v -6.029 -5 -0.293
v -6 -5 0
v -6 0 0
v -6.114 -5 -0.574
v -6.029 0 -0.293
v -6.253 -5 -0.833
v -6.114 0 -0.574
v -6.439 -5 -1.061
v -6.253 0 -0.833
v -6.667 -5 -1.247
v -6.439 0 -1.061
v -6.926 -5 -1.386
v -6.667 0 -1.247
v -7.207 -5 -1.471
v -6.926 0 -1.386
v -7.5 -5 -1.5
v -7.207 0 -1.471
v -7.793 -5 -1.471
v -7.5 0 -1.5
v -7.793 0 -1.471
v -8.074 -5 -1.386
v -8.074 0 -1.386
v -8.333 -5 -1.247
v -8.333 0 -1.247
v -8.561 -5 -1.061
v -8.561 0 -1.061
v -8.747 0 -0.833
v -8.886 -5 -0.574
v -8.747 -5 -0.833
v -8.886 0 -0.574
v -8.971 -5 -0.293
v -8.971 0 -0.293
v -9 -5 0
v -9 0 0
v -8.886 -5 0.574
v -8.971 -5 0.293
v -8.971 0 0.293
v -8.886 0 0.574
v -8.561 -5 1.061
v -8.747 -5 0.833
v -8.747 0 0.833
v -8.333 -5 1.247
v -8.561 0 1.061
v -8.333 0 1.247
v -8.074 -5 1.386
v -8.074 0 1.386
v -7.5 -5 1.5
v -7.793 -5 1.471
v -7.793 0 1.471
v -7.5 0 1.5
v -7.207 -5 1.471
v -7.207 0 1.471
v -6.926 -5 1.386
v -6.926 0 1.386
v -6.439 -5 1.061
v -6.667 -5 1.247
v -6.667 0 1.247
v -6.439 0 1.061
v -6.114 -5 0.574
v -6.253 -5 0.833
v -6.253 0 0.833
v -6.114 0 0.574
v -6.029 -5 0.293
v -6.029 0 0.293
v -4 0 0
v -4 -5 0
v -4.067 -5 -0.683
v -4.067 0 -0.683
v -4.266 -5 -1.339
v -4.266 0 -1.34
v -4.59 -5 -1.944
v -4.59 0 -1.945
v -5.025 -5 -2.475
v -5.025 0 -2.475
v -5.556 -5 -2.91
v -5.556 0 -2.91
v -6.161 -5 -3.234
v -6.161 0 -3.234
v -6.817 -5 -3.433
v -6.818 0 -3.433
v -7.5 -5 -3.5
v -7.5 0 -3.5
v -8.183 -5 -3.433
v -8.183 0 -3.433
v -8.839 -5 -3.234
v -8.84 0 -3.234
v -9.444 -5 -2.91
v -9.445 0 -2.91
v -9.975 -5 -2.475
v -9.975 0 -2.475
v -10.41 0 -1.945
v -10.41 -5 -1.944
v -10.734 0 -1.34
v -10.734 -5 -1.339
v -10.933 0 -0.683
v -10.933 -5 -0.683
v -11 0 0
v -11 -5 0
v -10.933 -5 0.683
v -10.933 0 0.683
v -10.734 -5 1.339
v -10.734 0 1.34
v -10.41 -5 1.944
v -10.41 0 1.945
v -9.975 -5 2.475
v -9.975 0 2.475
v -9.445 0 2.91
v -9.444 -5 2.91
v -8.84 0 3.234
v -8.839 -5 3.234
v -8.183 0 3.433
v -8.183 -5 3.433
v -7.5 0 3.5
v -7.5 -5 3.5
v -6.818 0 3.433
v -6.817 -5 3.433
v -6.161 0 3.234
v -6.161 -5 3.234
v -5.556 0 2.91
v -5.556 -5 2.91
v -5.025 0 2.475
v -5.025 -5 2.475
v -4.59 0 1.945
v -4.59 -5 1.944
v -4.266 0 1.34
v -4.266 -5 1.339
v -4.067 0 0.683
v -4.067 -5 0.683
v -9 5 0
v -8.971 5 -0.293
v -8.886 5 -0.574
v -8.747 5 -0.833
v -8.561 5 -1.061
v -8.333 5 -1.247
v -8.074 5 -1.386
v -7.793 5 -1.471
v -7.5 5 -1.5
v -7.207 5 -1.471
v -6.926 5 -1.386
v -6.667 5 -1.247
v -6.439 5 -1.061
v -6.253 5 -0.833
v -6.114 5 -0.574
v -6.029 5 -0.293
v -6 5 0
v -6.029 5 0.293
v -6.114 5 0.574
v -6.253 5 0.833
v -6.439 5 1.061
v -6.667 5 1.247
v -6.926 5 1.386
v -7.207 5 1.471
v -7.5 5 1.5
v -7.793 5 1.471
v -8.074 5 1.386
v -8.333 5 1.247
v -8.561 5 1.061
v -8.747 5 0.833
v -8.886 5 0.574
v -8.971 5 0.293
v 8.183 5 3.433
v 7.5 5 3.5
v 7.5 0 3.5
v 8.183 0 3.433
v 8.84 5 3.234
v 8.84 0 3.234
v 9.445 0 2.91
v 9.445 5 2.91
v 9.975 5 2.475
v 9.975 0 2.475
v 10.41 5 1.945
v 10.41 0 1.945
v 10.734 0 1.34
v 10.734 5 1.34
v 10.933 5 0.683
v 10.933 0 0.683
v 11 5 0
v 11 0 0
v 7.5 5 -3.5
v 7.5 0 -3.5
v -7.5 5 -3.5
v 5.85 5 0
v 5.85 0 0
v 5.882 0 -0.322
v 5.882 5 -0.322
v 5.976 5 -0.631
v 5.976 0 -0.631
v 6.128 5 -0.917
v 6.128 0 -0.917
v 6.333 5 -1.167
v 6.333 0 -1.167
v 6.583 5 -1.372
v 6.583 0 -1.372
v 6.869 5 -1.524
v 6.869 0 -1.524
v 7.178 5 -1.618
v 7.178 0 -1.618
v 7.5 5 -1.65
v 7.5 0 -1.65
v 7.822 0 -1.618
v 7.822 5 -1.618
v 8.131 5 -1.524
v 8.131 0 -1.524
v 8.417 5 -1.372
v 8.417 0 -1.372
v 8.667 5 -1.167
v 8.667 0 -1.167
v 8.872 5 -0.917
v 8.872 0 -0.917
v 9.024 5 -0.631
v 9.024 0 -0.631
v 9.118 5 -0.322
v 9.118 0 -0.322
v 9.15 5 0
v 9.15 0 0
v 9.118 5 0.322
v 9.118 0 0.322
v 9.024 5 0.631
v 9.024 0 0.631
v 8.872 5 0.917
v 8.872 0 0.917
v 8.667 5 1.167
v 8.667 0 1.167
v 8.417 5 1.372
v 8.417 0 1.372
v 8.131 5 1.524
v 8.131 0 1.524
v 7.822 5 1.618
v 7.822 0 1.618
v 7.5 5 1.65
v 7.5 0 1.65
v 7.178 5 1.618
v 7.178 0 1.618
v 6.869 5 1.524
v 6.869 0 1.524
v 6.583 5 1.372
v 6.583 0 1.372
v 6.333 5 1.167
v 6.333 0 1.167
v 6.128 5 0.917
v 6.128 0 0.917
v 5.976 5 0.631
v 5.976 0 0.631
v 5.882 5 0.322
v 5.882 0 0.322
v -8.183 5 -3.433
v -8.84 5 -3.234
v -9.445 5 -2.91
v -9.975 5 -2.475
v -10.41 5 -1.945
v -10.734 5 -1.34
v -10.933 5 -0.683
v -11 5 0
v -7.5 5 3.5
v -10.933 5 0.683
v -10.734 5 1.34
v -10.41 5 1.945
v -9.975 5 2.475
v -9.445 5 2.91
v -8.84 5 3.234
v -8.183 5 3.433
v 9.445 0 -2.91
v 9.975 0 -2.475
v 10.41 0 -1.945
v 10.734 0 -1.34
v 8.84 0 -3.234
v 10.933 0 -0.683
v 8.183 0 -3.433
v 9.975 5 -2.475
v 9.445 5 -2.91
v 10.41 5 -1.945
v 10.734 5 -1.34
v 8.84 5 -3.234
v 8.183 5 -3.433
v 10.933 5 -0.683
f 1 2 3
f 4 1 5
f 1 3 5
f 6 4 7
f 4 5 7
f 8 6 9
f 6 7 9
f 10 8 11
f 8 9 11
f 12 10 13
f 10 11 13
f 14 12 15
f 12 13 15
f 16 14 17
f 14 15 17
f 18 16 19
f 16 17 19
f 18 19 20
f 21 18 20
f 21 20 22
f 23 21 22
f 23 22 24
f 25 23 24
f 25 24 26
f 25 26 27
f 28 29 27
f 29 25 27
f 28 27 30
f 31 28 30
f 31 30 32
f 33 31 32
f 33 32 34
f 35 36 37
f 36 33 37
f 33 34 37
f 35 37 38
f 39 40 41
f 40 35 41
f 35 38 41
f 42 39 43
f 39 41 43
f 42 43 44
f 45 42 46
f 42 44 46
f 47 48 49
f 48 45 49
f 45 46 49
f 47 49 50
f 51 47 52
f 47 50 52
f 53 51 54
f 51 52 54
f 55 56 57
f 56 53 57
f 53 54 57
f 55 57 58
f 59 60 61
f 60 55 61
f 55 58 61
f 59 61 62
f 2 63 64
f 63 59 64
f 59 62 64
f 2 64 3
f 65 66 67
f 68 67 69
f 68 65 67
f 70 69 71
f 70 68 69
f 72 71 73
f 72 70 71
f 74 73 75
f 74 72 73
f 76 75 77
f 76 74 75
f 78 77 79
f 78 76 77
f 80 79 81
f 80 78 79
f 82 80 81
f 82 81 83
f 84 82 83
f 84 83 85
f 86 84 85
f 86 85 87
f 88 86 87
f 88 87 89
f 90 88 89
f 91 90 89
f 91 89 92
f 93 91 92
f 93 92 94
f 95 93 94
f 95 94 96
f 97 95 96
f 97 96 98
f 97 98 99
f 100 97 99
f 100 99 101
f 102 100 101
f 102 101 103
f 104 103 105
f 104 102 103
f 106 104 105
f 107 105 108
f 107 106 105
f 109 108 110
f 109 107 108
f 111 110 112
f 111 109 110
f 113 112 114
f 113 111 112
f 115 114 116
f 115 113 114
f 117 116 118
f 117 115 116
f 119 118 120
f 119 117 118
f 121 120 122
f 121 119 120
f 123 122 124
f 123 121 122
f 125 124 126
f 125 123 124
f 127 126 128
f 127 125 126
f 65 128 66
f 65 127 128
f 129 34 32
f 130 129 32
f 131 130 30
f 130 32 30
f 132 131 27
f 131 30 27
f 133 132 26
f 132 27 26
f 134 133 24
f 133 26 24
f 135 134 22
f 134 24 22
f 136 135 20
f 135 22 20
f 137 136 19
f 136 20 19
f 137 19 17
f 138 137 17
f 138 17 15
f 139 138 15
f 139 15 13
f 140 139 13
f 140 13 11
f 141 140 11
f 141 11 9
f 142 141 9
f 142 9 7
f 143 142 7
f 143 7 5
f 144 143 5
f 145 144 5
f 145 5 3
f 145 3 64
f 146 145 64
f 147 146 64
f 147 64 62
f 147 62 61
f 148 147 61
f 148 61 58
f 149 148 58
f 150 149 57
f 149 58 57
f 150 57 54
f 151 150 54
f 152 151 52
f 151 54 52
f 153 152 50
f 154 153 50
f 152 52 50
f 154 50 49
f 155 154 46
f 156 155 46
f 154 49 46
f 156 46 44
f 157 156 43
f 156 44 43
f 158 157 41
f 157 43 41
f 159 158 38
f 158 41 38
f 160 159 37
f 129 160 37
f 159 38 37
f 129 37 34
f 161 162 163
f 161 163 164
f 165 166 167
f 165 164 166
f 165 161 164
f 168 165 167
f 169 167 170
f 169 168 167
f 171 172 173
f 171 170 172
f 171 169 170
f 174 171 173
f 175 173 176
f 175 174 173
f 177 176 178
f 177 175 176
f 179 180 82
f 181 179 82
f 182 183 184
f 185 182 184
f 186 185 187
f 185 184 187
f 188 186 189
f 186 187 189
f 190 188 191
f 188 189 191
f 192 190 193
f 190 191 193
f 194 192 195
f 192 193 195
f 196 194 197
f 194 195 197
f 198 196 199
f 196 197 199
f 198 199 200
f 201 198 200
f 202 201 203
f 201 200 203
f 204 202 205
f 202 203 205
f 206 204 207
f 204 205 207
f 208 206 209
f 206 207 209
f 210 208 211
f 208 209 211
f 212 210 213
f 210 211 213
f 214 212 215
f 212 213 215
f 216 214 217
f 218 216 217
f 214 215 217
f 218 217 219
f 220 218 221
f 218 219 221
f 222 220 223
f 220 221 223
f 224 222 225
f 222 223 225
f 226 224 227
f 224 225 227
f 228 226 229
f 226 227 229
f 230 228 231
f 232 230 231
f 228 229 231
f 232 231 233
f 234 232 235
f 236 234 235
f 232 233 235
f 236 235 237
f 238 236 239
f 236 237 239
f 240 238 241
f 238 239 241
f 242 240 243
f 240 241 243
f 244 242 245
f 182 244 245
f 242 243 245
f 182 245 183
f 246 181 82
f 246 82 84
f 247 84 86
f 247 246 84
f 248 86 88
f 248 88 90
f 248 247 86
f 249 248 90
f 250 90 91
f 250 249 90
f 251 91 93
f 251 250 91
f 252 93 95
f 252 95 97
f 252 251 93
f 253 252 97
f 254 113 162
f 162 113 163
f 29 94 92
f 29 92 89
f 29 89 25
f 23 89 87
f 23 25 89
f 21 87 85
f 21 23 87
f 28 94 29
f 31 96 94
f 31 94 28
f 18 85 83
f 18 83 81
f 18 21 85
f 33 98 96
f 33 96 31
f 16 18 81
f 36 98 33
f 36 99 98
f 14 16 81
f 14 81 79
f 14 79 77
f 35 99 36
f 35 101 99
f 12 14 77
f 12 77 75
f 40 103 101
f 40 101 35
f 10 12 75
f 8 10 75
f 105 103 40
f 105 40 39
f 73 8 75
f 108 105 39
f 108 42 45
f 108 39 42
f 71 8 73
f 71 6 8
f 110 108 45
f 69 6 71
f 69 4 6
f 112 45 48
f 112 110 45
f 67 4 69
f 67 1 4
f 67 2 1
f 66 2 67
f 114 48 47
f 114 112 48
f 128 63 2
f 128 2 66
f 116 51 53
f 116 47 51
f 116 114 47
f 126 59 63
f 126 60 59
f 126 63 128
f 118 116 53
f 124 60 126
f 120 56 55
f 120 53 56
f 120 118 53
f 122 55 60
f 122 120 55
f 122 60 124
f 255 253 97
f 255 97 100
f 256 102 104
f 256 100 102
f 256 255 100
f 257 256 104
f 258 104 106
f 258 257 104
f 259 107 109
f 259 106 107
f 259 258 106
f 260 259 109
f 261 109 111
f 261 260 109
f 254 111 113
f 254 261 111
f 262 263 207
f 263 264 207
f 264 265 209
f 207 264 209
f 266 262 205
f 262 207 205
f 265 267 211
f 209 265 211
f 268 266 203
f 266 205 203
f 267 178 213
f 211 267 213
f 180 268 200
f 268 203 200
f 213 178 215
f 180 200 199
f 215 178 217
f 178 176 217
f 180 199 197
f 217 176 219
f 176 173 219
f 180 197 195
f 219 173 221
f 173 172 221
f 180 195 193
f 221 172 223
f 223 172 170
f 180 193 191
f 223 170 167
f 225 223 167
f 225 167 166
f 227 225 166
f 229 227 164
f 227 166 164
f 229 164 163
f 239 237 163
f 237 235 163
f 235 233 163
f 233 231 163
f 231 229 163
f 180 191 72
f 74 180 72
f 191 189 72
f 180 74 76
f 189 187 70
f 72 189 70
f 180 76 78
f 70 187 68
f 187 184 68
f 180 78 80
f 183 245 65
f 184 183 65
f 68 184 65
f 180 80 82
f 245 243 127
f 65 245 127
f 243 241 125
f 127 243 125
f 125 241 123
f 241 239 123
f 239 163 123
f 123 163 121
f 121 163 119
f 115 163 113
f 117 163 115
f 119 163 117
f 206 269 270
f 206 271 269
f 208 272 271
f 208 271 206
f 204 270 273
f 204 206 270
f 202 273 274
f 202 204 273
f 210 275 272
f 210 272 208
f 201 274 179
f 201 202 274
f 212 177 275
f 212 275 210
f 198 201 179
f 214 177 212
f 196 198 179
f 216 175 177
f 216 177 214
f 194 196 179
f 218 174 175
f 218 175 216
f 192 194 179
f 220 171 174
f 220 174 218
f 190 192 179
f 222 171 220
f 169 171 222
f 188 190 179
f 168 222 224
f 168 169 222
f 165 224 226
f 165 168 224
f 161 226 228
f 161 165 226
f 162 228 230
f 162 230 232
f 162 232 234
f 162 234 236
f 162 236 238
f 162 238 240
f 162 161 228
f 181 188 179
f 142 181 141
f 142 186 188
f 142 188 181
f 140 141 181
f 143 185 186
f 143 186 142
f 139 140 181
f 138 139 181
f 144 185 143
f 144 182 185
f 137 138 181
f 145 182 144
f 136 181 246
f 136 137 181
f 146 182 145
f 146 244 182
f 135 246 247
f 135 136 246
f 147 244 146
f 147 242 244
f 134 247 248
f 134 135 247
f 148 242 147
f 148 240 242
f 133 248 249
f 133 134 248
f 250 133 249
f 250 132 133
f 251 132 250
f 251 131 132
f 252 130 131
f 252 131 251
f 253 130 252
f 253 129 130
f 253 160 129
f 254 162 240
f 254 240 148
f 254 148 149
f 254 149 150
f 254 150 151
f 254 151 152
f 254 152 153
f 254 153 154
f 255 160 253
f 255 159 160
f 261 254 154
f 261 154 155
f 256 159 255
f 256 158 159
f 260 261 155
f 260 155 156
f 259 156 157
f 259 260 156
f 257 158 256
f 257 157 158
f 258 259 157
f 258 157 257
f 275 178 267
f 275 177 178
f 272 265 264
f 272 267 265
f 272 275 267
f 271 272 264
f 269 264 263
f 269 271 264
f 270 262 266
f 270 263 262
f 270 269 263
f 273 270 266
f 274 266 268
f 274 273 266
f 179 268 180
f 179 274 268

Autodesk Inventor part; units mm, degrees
ref_plane "YZ Plane" through (0, 0, 0) normal (1, 0, 0) x (0, 1, 0)
ref_plane "XZ Plane" through (0, 0, 0) normal (0, 1, 0) x (-1, 0, 0)
ref_plane "XY Plane" through (0, 0, 0) normal (0, 0, 1) x (1, 0, 0)
sketch "Sketch1" plane through (0, 0, 0) normal (0, 1, 0) x (-1, 0, 0)
  line L0 (-7.5, -3.5) -> (-7.5, 3.5)
  line L1 (-7.5, 3.5) -> (7.5, 3.5)
  line L2 (7.5, 3.5) -> (7.5, -3.5)
  line L3 (7.5, -3.5) -> (-7.5, -3.5)
  line L4 (-7.5, -3.5) -> (7.5, 3.5) construction
  line L5 (-7.5, 3.5) -> (7.5, -3.5) construction
  circle A0 centre (7.5, 0) radius 1.5
  circle A1 centre (-7.5, 0) radius 1.65
  line L6 (7.5, 3.5) -> (11, 3.5)
  line L7 (11, 3.5) -> (11, -3.5)
  line L8 (11, -3.5) -> (7.5, -3.5)
  line L9 (7.5, -3.5) -> (7.5, 3.5)
  line L10 (-7.5, 3.5) -> (-11, 3.5)
  line L11 (-11, 3.5) -> (-11, -3.5)
  line L12 (-11, -3.5) -> (-7.5, -3.5)
  line L13 (-7.5, -3.5) -> (-7.5, 3.5)
  point P0 (0, 0)
  dimension "d0" = 7
  dimension "d1" = 15
  dimension "d2" = 3
  dimension "d3" = 3.3
  dimension "d4" = 3.5
  dimension "d5" = 3.5
extrude "Extrusion1" add sketch "Sketch1" along normal blind 5 contours L12 L11 L10 L0 A1 | L0 A1 L1 L2 A0 L3 | L2 A0 L6 L7 L8
fillet "Fillet1" radius 3.5 4 edges at (-11, 2.5, -3.5) (-11, 2.5, 3.5) (11, 2.5, 3.5) (11, 2.5, -3.5)
sketch "Sketch2" plane through (0, 0, 0) normal (0, -1, 0) x (1, 0, 0)
  circle A0 centre (-7.5, 0) radius 1.5 projected
  circle A1 centre (-7.5, 0) radius 3.5
  circle A2 centre (-7.5, 0) radius 1.65
  point P0 (0, 0)
  dimension "d9" = 3.3
extrude "Extrusion2" add sketch "Sketch2" along normal blind 5 contours A1 | A2
properties part number "m"
